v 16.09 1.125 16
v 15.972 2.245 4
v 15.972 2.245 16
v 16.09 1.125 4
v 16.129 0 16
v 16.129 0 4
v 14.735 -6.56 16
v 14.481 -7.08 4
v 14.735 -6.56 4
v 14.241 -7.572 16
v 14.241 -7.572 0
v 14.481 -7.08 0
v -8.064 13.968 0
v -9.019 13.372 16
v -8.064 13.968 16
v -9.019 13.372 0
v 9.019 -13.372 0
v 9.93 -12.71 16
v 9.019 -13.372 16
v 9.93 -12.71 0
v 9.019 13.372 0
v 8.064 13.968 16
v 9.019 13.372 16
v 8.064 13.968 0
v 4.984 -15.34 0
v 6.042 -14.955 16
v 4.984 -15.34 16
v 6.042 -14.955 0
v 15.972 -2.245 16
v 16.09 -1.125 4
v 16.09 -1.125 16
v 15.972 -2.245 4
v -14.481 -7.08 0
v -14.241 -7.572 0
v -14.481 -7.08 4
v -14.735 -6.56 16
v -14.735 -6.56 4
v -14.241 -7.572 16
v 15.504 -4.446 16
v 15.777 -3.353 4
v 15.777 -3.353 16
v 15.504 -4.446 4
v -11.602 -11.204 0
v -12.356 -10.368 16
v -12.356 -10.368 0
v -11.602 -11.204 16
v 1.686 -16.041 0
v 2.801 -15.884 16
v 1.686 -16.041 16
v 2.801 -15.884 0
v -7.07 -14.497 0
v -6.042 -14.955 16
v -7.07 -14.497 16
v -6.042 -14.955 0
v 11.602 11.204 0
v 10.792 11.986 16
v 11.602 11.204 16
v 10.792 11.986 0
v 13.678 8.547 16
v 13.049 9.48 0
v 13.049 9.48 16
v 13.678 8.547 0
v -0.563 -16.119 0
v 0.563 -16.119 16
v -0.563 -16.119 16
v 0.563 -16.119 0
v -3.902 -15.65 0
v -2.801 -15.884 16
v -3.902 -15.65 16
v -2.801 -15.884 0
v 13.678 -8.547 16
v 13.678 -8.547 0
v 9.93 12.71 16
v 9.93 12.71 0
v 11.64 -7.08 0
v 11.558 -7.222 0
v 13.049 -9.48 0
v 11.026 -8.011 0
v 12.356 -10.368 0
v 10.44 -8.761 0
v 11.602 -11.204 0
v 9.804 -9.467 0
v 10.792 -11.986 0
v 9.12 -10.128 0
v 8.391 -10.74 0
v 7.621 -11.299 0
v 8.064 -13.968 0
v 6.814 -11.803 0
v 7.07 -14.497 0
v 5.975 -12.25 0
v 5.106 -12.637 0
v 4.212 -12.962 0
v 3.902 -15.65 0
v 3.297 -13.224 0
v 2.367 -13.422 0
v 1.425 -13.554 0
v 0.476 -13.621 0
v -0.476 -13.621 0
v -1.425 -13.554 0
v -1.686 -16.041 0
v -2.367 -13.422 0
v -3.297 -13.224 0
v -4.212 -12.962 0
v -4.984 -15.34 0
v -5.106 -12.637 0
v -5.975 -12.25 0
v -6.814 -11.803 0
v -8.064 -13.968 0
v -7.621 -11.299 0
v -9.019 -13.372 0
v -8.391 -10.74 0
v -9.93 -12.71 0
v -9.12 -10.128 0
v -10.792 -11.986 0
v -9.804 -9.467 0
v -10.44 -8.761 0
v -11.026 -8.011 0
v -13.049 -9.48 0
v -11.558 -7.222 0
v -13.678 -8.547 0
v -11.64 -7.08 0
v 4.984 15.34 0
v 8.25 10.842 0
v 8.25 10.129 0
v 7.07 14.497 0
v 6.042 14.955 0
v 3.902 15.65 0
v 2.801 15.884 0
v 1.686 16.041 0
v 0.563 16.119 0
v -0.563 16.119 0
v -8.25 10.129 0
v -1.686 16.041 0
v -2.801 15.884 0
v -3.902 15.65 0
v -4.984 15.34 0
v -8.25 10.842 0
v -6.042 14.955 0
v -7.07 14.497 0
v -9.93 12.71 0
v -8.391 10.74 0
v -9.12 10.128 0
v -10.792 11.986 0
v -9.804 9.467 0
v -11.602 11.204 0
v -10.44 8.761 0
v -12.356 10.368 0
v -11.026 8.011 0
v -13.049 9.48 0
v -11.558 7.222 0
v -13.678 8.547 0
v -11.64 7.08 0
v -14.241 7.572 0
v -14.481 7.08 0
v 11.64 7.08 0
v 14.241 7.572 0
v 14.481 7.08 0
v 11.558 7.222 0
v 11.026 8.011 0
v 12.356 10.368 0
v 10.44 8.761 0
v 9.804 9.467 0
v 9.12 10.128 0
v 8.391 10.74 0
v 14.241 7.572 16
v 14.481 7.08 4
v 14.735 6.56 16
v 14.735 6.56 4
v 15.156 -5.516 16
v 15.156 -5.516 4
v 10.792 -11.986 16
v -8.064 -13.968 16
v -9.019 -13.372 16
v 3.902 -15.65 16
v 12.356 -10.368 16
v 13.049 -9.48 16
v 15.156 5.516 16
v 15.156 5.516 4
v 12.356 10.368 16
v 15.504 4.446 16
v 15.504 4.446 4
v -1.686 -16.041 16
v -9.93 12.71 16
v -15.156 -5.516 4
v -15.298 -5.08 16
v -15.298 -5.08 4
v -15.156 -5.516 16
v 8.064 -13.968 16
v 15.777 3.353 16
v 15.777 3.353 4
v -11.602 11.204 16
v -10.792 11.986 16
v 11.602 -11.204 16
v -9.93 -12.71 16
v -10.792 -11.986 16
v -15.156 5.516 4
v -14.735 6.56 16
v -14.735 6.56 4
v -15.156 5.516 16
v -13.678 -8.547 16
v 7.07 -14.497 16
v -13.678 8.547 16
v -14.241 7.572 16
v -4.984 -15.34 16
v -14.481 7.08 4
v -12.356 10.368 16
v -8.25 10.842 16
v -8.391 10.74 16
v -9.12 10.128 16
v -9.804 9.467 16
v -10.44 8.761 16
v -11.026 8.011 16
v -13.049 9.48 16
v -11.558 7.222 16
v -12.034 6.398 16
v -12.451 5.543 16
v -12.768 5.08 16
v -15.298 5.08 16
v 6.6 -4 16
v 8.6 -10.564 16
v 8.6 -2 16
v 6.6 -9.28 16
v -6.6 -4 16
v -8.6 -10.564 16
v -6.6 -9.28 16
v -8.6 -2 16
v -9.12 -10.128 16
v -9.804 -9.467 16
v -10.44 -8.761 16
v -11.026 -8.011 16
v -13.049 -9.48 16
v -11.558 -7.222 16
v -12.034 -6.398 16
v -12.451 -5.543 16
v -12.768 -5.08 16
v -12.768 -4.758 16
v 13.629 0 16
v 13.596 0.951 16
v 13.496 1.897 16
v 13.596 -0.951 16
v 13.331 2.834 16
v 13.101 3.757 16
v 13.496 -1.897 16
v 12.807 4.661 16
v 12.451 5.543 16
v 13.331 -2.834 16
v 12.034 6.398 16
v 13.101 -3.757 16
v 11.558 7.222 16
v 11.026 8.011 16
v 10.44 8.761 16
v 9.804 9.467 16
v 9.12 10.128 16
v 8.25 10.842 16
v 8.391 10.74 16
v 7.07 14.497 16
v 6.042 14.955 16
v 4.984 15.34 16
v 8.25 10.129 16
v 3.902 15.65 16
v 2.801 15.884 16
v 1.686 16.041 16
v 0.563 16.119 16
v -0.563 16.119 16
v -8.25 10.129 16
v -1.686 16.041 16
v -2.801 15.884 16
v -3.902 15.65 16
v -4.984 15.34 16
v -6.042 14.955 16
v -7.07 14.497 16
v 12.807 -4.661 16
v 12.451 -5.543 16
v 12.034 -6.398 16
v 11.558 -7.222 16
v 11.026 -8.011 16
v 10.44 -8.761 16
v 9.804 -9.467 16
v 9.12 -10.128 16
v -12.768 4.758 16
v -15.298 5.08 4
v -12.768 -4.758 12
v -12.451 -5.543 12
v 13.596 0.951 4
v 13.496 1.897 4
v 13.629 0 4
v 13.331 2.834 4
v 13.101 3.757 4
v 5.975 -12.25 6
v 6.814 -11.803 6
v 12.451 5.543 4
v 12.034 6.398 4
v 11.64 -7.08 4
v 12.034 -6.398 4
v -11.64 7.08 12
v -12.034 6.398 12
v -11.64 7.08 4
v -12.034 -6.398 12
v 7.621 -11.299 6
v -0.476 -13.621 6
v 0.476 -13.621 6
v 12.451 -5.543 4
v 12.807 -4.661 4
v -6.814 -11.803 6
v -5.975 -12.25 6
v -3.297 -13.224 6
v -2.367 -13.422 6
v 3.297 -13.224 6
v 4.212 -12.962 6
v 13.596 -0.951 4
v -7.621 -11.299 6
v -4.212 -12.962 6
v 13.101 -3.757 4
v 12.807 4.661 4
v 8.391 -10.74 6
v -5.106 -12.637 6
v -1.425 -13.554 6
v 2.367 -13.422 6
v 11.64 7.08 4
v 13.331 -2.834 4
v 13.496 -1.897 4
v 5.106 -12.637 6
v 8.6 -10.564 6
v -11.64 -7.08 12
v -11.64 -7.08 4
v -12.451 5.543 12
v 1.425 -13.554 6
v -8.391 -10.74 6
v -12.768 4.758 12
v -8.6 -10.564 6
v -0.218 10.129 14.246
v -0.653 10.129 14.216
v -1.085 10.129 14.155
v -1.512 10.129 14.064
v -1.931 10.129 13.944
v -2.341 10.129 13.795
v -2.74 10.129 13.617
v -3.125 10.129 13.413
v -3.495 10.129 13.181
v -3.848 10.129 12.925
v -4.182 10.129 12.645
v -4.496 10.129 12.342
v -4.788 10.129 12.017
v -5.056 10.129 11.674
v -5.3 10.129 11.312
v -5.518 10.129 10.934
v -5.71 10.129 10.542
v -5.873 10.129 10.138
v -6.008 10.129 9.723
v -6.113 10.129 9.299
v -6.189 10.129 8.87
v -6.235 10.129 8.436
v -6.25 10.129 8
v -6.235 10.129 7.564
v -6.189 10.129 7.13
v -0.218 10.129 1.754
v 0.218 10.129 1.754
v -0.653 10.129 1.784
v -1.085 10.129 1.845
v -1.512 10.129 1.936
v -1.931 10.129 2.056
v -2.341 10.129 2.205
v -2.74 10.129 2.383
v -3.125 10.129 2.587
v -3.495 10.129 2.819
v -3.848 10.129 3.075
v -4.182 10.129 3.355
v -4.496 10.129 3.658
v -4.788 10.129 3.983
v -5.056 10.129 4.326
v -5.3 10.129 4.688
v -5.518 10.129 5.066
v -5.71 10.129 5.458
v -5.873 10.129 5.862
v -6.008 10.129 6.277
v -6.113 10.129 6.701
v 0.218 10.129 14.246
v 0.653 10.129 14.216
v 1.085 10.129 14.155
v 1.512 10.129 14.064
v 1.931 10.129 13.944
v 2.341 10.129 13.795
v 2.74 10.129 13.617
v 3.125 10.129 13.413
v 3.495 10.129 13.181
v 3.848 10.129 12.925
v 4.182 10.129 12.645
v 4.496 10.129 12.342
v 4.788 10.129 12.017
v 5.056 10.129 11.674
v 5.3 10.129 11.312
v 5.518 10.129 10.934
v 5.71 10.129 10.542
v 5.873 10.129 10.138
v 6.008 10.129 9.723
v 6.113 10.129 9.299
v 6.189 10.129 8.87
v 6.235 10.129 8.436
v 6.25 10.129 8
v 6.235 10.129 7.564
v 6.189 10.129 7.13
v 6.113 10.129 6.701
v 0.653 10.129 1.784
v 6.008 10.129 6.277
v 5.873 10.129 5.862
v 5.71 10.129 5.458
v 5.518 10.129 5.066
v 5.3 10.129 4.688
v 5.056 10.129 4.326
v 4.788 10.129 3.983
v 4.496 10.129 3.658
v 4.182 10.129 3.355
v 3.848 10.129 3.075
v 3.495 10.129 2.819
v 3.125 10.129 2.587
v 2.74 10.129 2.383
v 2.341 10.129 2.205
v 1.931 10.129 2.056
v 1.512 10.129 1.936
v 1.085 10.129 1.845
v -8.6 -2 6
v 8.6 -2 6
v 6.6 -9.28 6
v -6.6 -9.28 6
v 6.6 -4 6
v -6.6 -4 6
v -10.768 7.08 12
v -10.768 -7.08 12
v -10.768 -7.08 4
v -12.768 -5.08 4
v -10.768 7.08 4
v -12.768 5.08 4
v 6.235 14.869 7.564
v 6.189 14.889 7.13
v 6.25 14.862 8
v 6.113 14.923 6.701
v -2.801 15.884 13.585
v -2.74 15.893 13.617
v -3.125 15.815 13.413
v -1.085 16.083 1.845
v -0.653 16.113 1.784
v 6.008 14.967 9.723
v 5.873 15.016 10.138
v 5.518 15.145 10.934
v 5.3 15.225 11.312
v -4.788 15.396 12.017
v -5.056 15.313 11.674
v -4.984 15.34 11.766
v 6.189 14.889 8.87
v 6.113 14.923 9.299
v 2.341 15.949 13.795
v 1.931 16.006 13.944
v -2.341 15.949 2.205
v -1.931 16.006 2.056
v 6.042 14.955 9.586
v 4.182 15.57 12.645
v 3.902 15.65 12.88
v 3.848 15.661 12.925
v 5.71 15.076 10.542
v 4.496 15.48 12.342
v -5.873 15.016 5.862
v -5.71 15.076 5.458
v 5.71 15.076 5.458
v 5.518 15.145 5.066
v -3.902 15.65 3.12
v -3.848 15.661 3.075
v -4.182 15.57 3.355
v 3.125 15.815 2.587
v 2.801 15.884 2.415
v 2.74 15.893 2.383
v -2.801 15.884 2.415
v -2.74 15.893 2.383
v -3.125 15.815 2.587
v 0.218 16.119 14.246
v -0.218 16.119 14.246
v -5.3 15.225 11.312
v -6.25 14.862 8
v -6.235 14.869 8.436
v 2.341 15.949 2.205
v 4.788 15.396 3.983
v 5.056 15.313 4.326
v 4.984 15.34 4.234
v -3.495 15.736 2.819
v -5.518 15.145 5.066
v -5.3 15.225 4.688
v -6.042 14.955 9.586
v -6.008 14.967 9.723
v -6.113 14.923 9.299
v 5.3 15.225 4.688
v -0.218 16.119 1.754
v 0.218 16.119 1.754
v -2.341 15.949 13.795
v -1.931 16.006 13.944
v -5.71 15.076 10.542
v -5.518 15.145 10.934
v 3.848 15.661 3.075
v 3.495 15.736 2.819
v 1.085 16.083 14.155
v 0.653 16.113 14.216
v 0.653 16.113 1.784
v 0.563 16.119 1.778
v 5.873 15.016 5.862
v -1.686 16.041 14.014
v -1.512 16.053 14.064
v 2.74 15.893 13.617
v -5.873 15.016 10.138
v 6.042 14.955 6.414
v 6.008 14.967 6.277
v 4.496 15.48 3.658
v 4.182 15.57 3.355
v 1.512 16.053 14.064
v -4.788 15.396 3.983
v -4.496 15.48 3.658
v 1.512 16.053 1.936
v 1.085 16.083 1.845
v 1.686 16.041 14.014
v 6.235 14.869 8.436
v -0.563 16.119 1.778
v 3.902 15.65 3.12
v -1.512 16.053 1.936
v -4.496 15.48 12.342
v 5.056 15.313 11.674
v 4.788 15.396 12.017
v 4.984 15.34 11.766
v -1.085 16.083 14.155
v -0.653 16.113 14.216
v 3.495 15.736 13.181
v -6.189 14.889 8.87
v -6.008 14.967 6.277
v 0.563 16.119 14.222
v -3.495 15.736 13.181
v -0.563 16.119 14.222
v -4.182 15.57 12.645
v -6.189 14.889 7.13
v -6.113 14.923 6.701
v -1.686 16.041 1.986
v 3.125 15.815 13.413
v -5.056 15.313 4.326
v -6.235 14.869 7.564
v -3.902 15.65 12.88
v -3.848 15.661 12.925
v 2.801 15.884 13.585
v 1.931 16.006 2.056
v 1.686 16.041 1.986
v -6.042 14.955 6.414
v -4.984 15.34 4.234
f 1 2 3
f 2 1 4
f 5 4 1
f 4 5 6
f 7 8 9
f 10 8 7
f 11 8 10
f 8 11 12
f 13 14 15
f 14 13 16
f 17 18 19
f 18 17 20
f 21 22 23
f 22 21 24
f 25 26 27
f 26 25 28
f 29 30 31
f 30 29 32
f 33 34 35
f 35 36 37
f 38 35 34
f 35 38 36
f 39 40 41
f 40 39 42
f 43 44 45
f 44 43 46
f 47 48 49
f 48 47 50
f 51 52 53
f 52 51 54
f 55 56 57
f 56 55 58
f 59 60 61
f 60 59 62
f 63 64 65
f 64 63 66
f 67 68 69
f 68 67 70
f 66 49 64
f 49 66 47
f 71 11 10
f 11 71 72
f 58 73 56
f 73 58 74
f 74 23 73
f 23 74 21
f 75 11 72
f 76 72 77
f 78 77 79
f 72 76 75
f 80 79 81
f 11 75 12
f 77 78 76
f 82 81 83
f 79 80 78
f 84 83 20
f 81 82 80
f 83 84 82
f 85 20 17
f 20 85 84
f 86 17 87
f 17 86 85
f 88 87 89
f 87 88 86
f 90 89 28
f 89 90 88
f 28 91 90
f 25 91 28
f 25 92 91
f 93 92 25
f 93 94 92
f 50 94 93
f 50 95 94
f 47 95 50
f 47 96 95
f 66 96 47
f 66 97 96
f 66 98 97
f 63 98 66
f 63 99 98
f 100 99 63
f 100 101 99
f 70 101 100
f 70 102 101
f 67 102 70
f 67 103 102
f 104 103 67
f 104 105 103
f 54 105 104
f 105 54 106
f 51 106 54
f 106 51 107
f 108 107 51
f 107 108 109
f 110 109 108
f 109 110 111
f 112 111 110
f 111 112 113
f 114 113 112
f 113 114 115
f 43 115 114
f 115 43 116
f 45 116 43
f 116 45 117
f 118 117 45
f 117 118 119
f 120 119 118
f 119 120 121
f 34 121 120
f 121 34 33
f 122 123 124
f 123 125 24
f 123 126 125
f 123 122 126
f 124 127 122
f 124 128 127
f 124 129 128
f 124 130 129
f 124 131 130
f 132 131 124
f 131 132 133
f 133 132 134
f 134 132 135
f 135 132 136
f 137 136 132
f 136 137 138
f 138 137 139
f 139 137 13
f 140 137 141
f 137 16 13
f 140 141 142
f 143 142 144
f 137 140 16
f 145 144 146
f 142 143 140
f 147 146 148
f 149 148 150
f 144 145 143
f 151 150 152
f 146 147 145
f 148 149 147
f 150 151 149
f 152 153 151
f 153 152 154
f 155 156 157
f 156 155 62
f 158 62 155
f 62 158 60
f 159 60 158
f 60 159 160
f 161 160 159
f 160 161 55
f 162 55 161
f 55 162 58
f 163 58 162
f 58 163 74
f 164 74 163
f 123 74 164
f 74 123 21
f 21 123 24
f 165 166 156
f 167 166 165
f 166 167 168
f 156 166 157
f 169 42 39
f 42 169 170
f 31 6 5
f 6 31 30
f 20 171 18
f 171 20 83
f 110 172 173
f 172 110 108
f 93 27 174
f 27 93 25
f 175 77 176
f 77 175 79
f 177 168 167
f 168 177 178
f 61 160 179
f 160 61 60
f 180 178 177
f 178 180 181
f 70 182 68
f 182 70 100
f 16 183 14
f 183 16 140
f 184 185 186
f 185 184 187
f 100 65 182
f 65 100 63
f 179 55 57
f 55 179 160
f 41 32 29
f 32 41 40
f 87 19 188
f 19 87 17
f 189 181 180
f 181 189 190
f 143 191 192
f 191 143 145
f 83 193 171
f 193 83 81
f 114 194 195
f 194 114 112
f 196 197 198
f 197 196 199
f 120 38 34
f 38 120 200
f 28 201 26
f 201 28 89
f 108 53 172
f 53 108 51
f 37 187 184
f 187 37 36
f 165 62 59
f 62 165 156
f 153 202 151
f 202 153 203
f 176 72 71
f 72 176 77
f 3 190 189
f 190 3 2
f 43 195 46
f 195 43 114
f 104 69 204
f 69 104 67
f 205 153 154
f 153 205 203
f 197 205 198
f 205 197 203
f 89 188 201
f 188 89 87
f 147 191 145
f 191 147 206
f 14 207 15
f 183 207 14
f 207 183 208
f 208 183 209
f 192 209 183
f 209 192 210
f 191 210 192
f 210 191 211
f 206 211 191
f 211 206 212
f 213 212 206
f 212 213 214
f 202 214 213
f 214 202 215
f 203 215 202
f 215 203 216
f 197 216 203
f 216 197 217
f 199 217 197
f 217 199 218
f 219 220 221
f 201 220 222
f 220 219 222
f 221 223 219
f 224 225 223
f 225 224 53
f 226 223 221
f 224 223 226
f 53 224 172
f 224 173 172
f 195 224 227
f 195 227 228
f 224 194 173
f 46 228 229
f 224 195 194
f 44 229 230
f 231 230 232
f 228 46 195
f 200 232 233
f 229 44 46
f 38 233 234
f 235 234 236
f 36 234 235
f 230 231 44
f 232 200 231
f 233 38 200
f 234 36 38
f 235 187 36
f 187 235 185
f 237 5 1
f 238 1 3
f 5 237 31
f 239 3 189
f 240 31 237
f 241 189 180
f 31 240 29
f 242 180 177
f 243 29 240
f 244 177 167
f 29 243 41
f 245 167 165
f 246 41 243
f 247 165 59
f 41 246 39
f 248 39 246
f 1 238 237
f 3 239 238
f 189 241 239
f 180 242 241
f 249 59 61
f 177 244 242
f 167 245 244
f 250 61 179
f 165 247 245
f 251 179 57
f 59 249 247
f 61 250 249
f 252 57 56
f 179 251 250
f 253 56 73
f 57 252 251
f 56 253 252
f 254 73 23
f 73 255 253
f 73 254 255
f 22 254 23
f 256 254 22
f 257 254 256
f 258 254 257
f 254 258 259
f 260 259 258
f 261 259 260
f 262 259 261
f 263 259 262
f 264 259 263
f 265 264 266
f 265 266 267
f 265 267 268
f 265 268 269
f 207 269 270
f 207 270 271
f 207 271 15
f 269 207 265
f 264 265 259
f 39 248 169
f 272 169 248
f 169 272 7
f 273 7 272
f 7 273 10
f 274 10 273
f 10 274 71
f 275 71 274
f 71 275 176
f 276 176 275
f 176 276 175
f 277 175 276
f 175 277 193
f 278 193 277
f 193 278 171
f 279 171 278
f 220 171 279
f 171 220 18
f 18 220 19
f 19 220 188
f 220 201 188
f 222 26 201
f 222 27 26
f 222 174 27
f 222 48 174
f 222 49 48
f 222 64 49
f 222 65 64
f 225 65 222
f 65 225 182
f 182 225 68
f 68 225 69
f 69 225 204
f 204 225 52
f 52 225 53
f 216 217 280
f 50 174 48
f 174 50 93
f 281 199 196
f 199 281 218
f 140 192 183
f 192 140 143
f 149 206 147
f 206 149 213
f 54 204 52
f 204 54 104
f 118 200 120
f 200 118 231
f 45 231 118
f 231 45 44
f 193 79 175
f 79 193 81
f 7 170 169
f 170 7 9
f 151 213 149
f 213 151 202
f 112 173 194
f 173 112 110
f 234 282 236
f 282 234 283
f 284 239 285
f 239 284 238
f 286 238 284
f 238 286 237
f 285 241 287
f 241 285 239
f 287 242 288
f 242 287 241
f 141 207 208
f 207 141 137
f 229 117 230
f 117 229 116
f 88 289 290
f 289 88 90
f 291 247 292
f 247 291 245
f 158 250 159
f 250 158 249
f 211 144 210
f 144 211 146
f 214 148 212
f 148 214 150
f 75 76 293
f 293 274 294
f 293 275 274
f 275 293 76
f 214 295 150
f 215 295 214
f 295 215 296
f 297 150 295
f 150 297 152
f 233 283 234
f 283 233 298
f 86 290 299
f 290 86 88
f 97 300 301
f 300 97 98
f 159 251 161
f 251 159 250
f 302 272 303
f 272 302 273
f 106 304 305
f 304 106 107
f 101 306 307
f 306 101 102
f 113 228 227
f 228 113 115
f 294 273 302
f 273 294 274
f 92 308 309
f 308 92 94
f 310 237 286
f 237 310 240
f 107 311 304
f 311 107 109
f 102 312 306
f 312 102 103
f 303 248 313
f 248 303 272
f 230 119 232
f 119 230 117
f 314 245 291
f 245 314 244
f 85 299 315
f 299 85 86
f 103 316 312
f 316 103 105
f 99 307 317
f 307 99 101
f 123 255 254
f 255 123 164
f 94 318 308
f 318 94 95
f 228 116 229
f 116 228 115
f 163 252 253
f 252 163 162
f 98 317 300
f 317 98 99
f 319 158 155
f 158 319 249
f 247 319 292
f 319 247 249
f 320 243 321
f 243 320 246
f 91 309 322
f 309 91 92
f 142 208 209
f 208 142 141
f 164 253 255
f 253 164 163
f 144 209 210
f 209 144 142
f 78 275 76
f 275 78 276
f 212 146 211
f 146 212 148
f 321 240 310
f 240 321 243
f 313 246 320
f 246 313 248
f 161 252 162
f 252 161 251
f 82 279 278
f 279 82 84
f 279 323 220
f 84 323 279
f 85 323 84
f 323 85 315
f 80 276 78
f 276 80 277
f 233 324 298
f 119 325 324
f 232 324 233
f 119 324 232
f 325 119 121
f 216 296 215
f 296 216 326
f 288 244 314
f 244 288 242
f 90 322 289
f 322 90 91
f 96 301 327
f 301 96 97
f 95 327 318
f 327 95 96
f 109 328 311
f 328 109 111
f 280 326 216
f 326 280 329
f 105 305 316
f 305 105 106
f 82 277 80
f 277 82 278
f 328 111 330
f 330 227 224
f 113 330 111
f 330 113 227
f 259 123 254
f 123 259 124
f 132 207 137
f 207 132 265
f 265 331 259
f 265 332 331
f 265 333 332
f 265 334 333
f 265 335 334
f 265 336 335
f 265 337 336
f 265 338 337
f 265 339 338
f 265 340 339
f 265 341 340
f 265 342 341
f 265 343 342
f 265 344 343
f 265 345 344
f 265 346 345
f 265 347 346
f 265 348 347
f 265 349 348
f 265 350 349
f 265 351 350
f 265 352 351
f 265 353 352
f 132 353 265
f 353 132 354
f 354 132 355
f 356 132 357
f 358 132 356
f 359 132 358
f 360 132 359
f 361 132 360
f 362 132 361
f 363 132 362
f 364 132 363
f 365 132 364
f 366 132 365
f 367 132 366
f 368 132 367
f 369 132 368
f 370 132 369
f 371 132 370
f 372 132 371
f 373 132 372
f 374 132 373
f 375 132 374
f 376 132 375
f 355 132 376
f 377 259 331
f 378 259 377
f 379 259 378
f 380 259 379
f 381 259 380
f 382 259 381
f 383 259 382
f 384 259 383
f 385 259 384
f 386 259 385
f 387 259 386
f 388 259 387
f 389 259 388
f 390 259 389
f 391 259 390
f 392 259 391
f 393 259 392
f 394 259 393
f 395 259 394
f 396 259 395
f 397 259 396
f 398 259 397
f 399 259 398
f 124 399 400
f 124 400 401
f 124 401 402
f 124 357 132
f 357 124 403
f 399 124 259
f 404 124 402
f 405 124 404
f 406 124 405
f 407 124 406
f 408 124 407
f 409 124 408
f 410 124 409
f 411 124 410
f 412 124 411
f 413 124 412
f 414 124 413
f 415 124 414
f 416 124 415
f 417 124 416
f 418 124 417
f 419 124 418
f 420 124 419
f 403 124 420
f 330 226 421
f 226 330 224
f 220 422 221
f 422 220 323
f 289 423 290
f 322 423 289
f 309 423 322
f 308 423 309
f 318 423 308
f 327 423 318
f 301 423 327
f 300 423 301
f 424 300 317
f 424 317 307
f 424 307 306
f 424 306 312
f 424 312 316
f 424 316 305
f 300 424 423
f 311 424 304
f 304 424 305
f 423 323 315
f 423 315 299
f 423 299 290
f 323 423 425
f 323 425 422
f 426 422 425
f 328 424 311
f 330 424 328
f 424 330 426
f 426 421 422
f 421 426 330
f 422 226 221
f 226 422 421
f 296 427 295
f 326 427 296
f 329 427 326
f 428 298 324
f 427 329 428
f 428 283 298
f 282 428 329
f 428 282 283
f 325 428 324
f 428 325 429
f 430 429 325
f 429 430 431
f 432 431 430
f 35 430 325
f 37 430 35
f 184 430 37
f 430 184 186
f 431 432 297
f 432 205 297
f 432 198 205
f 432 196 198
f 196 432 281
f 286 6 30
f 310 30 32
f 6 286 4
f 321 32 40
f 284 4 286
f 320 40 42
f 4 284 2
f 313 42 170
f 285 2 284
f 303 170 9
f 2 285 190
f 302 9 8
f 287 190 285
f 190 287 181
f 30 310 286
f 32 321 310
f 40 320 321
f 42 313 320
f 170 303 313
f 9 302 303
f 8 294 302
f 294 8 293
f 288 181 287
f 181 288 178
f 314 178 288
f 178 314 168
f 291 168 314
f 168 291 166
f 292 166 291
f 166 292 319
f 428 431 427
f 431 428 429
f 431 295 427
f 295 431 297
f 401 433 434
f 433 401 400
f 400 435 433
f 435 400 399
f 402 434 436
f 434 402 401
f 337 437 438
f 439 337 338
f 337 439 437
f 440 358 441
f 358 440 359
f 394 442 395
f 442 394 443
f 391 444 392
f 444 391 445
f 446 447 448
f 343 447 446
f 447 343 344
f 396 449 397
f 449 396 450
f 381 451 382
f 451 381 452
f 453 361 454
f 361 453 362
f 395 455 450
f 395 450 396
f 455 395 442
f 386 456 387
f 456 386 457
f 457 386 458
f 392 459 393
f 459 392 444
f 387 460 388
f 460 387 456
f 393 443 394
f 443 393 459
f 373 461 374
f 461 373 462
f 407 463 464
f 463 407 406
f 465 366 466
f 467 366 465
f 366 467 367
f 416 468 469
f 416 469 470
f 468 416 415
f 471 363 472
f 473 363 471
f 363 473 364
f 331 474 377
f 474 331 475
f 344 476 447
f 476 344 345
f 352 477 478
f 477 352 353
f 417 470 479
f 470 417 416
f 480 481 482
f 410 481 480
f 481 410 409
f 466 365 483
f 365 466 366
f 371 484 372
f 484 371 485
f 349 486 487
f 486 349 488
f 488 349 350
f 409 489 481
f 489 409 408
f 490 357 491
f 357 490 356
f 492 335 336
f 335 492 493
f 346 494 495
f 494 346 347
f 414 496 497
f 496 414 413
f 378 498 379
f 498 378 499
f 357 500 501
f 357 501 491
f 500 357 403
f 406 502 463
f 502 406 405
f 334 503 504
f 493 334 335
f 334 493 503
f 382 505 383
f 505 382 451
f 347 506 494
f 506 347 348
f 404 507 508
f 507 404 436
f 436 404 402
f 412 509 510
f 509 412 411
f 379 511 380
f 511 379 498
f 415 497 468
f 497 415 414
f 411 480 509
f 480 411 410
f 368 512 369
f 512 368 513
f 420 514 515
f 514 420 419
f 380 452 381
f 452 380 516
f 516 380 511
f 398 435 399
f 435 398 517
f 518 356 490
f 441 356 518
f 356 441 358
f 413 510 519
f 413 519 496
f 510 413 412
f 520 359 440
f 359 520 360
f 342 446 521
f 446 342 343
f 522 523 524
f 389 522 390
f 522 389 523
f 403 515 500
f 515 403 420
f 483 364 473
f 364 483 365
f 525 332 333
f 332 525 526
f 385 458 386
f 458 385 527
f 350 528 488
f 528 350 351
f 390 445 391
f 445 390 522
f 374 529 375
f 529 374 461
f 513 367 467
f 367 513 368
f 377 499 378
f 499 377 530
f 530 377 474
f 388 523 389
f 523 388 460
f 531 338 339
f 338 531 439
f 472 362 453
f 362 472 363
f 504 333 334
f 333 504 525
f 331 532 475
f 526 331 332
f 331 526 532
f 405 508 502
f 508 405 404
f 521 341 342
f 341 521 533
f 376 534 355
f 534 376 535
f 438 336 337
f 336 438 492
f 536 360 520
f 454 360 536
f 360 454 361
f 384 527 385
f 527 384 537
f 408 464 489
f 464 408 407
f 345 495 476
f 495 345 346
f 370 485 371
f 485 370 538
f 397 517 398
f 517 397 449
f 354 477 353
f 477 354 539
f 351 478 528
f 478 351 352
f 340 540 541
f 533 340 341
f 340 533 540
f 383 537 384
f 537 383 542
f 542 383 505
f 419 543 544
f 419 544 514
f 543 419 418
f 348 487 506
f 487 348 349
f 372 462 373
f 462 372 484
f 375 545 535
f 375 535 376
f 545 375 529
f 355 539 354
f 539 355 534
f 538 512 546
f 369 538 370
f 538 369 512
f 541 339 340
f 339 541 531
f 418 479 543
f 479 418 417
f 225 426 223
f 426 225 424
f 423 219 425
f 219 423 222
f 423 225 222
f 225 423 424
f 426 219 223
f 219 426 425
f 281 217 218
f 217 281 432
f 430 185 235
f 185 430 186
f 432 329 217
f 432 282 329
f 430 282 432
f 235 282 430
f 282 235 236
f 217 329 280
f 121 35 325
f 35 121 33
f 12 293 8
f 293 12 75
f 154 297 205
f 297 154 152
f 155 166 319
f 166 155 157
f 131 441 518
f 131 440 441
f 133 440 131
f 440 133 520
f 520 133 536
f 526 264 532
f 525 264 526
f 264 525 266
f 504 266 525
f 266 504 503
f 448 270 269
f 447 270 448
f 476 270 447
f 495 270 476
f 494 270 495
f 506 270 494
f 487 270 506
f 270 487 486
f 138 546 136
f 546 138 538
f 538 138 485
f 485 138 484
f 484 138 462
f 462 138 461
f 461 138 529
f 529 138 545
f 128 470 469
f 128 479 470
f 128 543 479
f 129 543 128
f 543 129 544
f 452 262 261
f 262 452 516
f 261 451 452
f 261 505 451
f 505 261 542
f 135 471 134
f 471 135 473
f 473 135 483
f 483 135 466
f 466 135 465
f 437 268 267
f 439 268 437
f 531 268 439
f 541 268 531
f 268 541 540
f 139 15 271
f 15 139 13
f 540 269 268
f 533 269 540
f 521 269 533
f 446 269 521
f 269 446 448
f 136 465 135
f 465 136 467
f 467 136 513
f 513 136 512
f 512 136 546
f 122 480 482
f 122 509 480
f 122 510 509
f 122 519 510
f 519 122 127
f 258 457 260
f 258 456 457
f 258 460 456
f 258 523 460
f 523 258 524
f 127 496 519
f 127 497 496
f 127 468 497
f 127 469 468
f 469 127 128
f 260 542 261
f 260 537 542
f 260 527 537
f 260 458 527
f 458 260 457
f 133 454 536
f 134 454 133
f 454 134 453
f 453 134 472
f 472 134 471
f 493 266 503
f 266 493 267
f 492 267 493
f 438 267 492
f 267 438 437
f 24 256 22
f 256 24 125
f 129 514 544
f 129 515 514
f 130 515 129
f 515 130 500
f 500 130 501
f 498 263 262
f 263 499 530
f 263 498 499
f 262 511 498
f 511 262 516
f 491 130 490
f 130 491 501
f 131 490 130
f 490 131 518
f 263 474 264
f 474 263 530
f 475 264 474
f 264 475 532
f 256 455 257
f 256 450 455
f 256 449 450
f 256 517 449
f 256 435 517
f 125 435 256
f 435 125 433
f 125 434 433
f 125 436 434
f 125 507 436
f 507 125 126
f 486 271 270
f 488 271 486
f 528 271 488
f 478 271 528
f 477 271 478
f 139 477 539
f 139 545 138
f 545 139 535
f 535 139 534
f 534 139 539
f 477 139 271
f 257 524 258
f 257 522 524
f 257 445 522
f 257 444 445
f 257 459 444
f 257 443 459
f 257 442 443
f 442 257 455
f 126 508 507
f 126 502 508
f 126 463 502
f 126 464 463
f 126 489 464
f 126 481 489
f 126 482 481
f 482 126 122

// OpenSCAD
// file: dim.scad
FACES 				= 180;
EPSILON 			= 0.1;

INCHES_TO_MM 		= 25.4;
MM_TO_INCHES 		= 1 / INCHES_TO_MM;

// Marks - absolute location.
M_WAY_BACK          = -40;
M_POMMEL            = -37;      // approximate. hard to measure.
M_SPEAKER_BACK      = -36;
M_0                 = 0;        // physical back of the lightsaber main body.
M_AFT_STOP          = 10;
M_DISPLAY           = 14;       // was 15
M_PORT_CENTER       = 58;
M_CRYSTAL_VIEW_CENTER = 93;
M_SWITCH_CENTER     = 147.5;
M_EMITTER_BASE      = 165.5;
M_EMITTER           = M_EMITTER_BASE + 0;

M_MC                = 68;

H_FAR               = 240;

// inner diameter of the lightsaber tube.
// shock is constant, within tolerances
D_INNER      		= 32.258;
R_INNER             = D_INNER / 2;
D_INNER_CORE        = 25;
D_OUTER             = 37.6;
D_AFT               = 25.8;
R_AFT               = D_AFT / 2;
D_AFT_RING          = 33.5;
H_AFT_RING          = 6;
H_AFT_LIP           = 4;
FLOOR_Y             = -12;
Y_FLATTEN           = -15;

M_AFT_STOP_FRONT    = M_AFT_STOP + H_AFT_RING + H_AFT_LIP;

H_SPEAKER = 3.6 + 1.0;  // space for the physical speaker
X_SPEAKER = 20;
Y_SPEAKER = 14.2;   
Y_SPEAKER_INNER = 8.4;  // air channel
H_SPEAKER_HOLDER = H_SPEAKER + 1.2;

// emitter head
D_EMITTER_RING      = 33.4;

// dimensions of the main ring.
H_RING 				= 16;
T_RING 				= 2.5;

// dimensions of pin holders and pins
PIN	   				= 2.54;
H_PIN_HOLDER 		= 8;
T_PIN_HOLDER_WALL 	= 2;

N_TEETH				= 2;
TEETH_ANGLE			= 90;

// Pin counts:
X_EMITTER 			= 4;
Y_EMITTER 			= 1;

H_BUTTRESS			= 3.5;       // internal buttress / baffles
DZ_BUTTRESS         = 4.5;

M_ZONE_0            = M_DISPLAY;
M_ZONE_1            = M_AFT_STOP_FRONT + H_BUTTRESS*5 + DZ_BUTTRESS*6 - 0.001;
M_ZONE_2            = M_AFT_STOP_FRONT + H_BUTTRESS*14 + DZ_BUTTRESS*14 + 0.001;
M_ZONE_3            = M_EMITTER_BASE;

W_CRYSTAL           = 12.1;
H_CRYSTAL           = 10;
Y_CRYSTAL           = 9;        // offset up of the crystal
Z_CRYSTAL           = 52;

DISPLAY_W           = 23 + 0.5;
DISPLAY_L           = 32 + 0.5;
DISPLAY_MOUNT_W     = 17;
DISPLAY_MOUNT_L     = 26;
D_DISPLAY_MOUNT     = 2;
Y_DISPLAY           = 10;
DISPLAY_PINS        = 20;

D_SWITCH			= 12.5;						// actually 12, by thread.
Y_SWITCH            = 13.5;

D_PORT              = 7.9;

W_MC                = 18;
H_MC                = 11;
Z_MC_35             = 71.5;     // includes SD
SHOULDER_DX         = 2.5;
SHOULDER_DZ         = 3.5;

X_ROD               = 10.5;
Y_ROD               =  3.5;
D_ROD               =  3.4;

POWER_DX            = 9.6;
POWER_DY            = 14;
POWER_DZ            = 11;
POWER_Y             = 0.5;

H_BATTERY           = 68;
D_BATTERY           = 18.50 + 0.5;    // An 1850. Huh. 
DY_BATTERY          = -1;

X_DOTSTAR           = 5.0 + 0.5;  // from spec
Y_DOTSTAR           = 1.4;  // from spec
DOTSTAR_STRIP       = 12.4;

DX_USB              = 21.0;
DX_USB_INNER        = 14.0;
DY_USB              = 10.4;
SLOT_USB            = 1.0;

OFFSET_EMITTER = -PIN + sqrt(R_INNER * R_INNER - PIN * PIN * X_EMITTER * X_EMITTER / 4);

module emitterPin(h, longY)
{
	Y = longY ? 40 : PIN;

    translate([-X_EMITTER * PIN / 2, OFFSET_EMITTER, 0]) {
        cube([X_EMITTER * PIN, Y, h]);
    }	
}

module emitterHolder(h)
{
    translate([-X_EMITTER * PIN / 2, OFFSET_EMITTER, 0]) {
    	translate([-T_PIN_HOLDER_WALL, -T_PIN_HOLDER_WALL, 0]) {
      		cube([X_EMITTER * PIN + T_PIN_HOLDER_WALL*2, PIN + T_PIN_HOLDER_WALL*2, h]);
    	}
    }	
	
}

// Uses the same dimensions as the emitter holder so they 
// can be used interchangeably.
module lock(h)
{
    translate([-X_EMITTER * PIN / 2 - T_PIN_HOLDER_WALL, -20, 0]) {
		cube([X_EMITTER * PIN + T_PIN_HOLDER_WALL * 2, 40, h]);
	}	
}
// file: ../shapes.scad
FACES   = 180;
EPSILON = 0.1;
PIN	    = 2.54;


module tube(h=1, inner=0, outer=0, di=0, do=0) {
    rInner = inner > 0 ? inner : di / 2;
    rOuter = outer > 0 ? outer : do / 2;

	if (rInner >= rOuter) echo("ERROR in tube. rOuter must be > rInner.");

	difference() {
		cylinder(h=h, r=rOuter);
		translate([0,0,-EPSILON]) {
			cylinder(h=h + EPSILON*2, r=rInner);
		}
	}
}

module roundedRect(h, d)
{
	D0 = d * 0.8;
	D1 = d * 0.2;
	H = h;

	hull()
	{
		translate([-D0/2, -D0/2, 0]) {
			cube([D0, D0, H]);
		}
		translate([-D0/2, -D0/2, 0])  cylinder(d=D1, h=H);
		translate([ D0/2, -D0/2, 0])  cylinder(d=D1, h=H);
		translate([-D0/2,  D0/2, 0])  cylinder(d=D1, h=H);
		translate([ D0/2,  D0/2, 0])  cylinder(d=D1, h=H);
	}
}

module cubePair(x, size)
{
	translate([x, 0, 0])
		cube(size=size);
	mirror([1,0,0]) translate([x, 0, 0])
		cube(size=size);
}

module polygonXY(h, points)
{
    linear_extrude(height = h) {
        polygon(points=points);
    }  
}

module polygonYZ(h, points)
{
    multmatrix(m = [ [0, 0, 1, 0],
    				 [1, 0, 0, 0],
    				 [0, 1, 0, 0],
    				 [0, 0, 0, 1]
       			   ])
    linear_extrude(height = h) {
        polygon(points=points);
    }  	
}

module polygonXZ(h, points)
{
    multmatrix(m = [ [1, 0, 0, 0],
    				 [0, 0, 1, 0],
    				 [0, 1, 0, 0],
    				 [0, 0, 0, 1]
       			   ])
    linear_extrude(height = h) {
        polygon(points=points);
    }  	
}


module zCapsule(dz0, dz1, r)
{
    hull() {
        translate([0, 0, dz0]) rotate([-90, 0, 0]) cylinder(h=50, r=r);
        translate([0, 0, dz1]) rotate([-90, 0, 0]) cylinder(h=50, r=r);
    }
}


module xRoofCube(size)
{
	x = size[0];
	y = size[1];
	z = size[2];

	polygonXY(h=z, points=[
		[0, 0],
		[x, 0],
		[x, y + x],		// gets the 45 degree angle for printing
		[0, y]
	]);
}
// main file
use <../shapes.scad>
include <dim.scad>

$fn = 90;

X_MC = 5;
Y_MC = 2;
MC_OFFSET = 4;
MC_WIDTH  = X_MC * PIN + 0.5;
MC_HEIGHT = Y_MC * PIN + 0.2;
H_LOCK = 4;
	
module portPin(h)
{	
	translate([-MC_WIDTH/2, MC_OFFSET, 0]) {
		cube(size=[MC_WIDTH, MC_HEIGHT, h]);
  	}
}

module portHolder(h, longY)
{
	Y = longY ? 40 : MC_HEIGHT + T_PIN_HOLDER_WALL*2;

	translate([-MC_WIDTH/2, MC_OFFSET, 0]) {
    	translate([-T_PIN_HOLDER_WALL, -T_PIN_HOLDER_WALL, 0]) {
			cube(size=[MC_WIDTH + T_PIN_HOLDER_WALL*2, Y, h]);
		}
	}
}

// Ring 
intersection()
{
	// Keep everything in the cylinder!
	cylinder(h=H_RING, r=D_INNER/2);	
	difference() {
		union() {
			// The ring.
			tube(H_RING, D_INNER/2 - T_RING, D_INNER/2);
			// switch support.
			translate([-D_SWITCH/2 - 2, D_INNER/2 - 6, 0]) {
				cube(size=[D_SWITCH + 4, 10, H_RING]);
			}

			// Microcontroller port.
			rotate([0, 0, 180]) {
				translate([0, 0, H_RING - H_PIN_HOLDER-2]) {
					portHolder(H_PIN_HOLDER+2, true);
				}
			}
			// Emitter port
			rotate([0, 0, 90]) {
                translate([0, 0, H_LOCK]) {
                    emitterHolder(H_PIN_HOLDER);
                }
			}
		}

		// Remove switch.
		translate([0, 0, H_RING/2]) {
			rotate([-90, 0, 0]) {
				cylinder(d=D_SWITCH, h=D_INNER/2 + 1);
			}
		}
		// Remove Microcontroller
		rotate([0, 0, 180]) {
			portPin(H_RING, true);
		}

		// Remove port.
		rotate([0, 0, 90]) {
			emitterPin(H_RING, true);
		}
        
        // Remove lock
		rotate([0, 0, 90]) {
            lock(H_LOCK);
		}
	}
}

// Lock
/*color("gray") {
	translate([0, 0, -H_LOCK]) {
		rotate([0, 0, 90]) {
			difference() 
			{
				tube(H_LOCK, D_INNER/2 - T_RING, D_INNER/2);
				lock(H_LOCK);
			}
		}
	}
}
*/
